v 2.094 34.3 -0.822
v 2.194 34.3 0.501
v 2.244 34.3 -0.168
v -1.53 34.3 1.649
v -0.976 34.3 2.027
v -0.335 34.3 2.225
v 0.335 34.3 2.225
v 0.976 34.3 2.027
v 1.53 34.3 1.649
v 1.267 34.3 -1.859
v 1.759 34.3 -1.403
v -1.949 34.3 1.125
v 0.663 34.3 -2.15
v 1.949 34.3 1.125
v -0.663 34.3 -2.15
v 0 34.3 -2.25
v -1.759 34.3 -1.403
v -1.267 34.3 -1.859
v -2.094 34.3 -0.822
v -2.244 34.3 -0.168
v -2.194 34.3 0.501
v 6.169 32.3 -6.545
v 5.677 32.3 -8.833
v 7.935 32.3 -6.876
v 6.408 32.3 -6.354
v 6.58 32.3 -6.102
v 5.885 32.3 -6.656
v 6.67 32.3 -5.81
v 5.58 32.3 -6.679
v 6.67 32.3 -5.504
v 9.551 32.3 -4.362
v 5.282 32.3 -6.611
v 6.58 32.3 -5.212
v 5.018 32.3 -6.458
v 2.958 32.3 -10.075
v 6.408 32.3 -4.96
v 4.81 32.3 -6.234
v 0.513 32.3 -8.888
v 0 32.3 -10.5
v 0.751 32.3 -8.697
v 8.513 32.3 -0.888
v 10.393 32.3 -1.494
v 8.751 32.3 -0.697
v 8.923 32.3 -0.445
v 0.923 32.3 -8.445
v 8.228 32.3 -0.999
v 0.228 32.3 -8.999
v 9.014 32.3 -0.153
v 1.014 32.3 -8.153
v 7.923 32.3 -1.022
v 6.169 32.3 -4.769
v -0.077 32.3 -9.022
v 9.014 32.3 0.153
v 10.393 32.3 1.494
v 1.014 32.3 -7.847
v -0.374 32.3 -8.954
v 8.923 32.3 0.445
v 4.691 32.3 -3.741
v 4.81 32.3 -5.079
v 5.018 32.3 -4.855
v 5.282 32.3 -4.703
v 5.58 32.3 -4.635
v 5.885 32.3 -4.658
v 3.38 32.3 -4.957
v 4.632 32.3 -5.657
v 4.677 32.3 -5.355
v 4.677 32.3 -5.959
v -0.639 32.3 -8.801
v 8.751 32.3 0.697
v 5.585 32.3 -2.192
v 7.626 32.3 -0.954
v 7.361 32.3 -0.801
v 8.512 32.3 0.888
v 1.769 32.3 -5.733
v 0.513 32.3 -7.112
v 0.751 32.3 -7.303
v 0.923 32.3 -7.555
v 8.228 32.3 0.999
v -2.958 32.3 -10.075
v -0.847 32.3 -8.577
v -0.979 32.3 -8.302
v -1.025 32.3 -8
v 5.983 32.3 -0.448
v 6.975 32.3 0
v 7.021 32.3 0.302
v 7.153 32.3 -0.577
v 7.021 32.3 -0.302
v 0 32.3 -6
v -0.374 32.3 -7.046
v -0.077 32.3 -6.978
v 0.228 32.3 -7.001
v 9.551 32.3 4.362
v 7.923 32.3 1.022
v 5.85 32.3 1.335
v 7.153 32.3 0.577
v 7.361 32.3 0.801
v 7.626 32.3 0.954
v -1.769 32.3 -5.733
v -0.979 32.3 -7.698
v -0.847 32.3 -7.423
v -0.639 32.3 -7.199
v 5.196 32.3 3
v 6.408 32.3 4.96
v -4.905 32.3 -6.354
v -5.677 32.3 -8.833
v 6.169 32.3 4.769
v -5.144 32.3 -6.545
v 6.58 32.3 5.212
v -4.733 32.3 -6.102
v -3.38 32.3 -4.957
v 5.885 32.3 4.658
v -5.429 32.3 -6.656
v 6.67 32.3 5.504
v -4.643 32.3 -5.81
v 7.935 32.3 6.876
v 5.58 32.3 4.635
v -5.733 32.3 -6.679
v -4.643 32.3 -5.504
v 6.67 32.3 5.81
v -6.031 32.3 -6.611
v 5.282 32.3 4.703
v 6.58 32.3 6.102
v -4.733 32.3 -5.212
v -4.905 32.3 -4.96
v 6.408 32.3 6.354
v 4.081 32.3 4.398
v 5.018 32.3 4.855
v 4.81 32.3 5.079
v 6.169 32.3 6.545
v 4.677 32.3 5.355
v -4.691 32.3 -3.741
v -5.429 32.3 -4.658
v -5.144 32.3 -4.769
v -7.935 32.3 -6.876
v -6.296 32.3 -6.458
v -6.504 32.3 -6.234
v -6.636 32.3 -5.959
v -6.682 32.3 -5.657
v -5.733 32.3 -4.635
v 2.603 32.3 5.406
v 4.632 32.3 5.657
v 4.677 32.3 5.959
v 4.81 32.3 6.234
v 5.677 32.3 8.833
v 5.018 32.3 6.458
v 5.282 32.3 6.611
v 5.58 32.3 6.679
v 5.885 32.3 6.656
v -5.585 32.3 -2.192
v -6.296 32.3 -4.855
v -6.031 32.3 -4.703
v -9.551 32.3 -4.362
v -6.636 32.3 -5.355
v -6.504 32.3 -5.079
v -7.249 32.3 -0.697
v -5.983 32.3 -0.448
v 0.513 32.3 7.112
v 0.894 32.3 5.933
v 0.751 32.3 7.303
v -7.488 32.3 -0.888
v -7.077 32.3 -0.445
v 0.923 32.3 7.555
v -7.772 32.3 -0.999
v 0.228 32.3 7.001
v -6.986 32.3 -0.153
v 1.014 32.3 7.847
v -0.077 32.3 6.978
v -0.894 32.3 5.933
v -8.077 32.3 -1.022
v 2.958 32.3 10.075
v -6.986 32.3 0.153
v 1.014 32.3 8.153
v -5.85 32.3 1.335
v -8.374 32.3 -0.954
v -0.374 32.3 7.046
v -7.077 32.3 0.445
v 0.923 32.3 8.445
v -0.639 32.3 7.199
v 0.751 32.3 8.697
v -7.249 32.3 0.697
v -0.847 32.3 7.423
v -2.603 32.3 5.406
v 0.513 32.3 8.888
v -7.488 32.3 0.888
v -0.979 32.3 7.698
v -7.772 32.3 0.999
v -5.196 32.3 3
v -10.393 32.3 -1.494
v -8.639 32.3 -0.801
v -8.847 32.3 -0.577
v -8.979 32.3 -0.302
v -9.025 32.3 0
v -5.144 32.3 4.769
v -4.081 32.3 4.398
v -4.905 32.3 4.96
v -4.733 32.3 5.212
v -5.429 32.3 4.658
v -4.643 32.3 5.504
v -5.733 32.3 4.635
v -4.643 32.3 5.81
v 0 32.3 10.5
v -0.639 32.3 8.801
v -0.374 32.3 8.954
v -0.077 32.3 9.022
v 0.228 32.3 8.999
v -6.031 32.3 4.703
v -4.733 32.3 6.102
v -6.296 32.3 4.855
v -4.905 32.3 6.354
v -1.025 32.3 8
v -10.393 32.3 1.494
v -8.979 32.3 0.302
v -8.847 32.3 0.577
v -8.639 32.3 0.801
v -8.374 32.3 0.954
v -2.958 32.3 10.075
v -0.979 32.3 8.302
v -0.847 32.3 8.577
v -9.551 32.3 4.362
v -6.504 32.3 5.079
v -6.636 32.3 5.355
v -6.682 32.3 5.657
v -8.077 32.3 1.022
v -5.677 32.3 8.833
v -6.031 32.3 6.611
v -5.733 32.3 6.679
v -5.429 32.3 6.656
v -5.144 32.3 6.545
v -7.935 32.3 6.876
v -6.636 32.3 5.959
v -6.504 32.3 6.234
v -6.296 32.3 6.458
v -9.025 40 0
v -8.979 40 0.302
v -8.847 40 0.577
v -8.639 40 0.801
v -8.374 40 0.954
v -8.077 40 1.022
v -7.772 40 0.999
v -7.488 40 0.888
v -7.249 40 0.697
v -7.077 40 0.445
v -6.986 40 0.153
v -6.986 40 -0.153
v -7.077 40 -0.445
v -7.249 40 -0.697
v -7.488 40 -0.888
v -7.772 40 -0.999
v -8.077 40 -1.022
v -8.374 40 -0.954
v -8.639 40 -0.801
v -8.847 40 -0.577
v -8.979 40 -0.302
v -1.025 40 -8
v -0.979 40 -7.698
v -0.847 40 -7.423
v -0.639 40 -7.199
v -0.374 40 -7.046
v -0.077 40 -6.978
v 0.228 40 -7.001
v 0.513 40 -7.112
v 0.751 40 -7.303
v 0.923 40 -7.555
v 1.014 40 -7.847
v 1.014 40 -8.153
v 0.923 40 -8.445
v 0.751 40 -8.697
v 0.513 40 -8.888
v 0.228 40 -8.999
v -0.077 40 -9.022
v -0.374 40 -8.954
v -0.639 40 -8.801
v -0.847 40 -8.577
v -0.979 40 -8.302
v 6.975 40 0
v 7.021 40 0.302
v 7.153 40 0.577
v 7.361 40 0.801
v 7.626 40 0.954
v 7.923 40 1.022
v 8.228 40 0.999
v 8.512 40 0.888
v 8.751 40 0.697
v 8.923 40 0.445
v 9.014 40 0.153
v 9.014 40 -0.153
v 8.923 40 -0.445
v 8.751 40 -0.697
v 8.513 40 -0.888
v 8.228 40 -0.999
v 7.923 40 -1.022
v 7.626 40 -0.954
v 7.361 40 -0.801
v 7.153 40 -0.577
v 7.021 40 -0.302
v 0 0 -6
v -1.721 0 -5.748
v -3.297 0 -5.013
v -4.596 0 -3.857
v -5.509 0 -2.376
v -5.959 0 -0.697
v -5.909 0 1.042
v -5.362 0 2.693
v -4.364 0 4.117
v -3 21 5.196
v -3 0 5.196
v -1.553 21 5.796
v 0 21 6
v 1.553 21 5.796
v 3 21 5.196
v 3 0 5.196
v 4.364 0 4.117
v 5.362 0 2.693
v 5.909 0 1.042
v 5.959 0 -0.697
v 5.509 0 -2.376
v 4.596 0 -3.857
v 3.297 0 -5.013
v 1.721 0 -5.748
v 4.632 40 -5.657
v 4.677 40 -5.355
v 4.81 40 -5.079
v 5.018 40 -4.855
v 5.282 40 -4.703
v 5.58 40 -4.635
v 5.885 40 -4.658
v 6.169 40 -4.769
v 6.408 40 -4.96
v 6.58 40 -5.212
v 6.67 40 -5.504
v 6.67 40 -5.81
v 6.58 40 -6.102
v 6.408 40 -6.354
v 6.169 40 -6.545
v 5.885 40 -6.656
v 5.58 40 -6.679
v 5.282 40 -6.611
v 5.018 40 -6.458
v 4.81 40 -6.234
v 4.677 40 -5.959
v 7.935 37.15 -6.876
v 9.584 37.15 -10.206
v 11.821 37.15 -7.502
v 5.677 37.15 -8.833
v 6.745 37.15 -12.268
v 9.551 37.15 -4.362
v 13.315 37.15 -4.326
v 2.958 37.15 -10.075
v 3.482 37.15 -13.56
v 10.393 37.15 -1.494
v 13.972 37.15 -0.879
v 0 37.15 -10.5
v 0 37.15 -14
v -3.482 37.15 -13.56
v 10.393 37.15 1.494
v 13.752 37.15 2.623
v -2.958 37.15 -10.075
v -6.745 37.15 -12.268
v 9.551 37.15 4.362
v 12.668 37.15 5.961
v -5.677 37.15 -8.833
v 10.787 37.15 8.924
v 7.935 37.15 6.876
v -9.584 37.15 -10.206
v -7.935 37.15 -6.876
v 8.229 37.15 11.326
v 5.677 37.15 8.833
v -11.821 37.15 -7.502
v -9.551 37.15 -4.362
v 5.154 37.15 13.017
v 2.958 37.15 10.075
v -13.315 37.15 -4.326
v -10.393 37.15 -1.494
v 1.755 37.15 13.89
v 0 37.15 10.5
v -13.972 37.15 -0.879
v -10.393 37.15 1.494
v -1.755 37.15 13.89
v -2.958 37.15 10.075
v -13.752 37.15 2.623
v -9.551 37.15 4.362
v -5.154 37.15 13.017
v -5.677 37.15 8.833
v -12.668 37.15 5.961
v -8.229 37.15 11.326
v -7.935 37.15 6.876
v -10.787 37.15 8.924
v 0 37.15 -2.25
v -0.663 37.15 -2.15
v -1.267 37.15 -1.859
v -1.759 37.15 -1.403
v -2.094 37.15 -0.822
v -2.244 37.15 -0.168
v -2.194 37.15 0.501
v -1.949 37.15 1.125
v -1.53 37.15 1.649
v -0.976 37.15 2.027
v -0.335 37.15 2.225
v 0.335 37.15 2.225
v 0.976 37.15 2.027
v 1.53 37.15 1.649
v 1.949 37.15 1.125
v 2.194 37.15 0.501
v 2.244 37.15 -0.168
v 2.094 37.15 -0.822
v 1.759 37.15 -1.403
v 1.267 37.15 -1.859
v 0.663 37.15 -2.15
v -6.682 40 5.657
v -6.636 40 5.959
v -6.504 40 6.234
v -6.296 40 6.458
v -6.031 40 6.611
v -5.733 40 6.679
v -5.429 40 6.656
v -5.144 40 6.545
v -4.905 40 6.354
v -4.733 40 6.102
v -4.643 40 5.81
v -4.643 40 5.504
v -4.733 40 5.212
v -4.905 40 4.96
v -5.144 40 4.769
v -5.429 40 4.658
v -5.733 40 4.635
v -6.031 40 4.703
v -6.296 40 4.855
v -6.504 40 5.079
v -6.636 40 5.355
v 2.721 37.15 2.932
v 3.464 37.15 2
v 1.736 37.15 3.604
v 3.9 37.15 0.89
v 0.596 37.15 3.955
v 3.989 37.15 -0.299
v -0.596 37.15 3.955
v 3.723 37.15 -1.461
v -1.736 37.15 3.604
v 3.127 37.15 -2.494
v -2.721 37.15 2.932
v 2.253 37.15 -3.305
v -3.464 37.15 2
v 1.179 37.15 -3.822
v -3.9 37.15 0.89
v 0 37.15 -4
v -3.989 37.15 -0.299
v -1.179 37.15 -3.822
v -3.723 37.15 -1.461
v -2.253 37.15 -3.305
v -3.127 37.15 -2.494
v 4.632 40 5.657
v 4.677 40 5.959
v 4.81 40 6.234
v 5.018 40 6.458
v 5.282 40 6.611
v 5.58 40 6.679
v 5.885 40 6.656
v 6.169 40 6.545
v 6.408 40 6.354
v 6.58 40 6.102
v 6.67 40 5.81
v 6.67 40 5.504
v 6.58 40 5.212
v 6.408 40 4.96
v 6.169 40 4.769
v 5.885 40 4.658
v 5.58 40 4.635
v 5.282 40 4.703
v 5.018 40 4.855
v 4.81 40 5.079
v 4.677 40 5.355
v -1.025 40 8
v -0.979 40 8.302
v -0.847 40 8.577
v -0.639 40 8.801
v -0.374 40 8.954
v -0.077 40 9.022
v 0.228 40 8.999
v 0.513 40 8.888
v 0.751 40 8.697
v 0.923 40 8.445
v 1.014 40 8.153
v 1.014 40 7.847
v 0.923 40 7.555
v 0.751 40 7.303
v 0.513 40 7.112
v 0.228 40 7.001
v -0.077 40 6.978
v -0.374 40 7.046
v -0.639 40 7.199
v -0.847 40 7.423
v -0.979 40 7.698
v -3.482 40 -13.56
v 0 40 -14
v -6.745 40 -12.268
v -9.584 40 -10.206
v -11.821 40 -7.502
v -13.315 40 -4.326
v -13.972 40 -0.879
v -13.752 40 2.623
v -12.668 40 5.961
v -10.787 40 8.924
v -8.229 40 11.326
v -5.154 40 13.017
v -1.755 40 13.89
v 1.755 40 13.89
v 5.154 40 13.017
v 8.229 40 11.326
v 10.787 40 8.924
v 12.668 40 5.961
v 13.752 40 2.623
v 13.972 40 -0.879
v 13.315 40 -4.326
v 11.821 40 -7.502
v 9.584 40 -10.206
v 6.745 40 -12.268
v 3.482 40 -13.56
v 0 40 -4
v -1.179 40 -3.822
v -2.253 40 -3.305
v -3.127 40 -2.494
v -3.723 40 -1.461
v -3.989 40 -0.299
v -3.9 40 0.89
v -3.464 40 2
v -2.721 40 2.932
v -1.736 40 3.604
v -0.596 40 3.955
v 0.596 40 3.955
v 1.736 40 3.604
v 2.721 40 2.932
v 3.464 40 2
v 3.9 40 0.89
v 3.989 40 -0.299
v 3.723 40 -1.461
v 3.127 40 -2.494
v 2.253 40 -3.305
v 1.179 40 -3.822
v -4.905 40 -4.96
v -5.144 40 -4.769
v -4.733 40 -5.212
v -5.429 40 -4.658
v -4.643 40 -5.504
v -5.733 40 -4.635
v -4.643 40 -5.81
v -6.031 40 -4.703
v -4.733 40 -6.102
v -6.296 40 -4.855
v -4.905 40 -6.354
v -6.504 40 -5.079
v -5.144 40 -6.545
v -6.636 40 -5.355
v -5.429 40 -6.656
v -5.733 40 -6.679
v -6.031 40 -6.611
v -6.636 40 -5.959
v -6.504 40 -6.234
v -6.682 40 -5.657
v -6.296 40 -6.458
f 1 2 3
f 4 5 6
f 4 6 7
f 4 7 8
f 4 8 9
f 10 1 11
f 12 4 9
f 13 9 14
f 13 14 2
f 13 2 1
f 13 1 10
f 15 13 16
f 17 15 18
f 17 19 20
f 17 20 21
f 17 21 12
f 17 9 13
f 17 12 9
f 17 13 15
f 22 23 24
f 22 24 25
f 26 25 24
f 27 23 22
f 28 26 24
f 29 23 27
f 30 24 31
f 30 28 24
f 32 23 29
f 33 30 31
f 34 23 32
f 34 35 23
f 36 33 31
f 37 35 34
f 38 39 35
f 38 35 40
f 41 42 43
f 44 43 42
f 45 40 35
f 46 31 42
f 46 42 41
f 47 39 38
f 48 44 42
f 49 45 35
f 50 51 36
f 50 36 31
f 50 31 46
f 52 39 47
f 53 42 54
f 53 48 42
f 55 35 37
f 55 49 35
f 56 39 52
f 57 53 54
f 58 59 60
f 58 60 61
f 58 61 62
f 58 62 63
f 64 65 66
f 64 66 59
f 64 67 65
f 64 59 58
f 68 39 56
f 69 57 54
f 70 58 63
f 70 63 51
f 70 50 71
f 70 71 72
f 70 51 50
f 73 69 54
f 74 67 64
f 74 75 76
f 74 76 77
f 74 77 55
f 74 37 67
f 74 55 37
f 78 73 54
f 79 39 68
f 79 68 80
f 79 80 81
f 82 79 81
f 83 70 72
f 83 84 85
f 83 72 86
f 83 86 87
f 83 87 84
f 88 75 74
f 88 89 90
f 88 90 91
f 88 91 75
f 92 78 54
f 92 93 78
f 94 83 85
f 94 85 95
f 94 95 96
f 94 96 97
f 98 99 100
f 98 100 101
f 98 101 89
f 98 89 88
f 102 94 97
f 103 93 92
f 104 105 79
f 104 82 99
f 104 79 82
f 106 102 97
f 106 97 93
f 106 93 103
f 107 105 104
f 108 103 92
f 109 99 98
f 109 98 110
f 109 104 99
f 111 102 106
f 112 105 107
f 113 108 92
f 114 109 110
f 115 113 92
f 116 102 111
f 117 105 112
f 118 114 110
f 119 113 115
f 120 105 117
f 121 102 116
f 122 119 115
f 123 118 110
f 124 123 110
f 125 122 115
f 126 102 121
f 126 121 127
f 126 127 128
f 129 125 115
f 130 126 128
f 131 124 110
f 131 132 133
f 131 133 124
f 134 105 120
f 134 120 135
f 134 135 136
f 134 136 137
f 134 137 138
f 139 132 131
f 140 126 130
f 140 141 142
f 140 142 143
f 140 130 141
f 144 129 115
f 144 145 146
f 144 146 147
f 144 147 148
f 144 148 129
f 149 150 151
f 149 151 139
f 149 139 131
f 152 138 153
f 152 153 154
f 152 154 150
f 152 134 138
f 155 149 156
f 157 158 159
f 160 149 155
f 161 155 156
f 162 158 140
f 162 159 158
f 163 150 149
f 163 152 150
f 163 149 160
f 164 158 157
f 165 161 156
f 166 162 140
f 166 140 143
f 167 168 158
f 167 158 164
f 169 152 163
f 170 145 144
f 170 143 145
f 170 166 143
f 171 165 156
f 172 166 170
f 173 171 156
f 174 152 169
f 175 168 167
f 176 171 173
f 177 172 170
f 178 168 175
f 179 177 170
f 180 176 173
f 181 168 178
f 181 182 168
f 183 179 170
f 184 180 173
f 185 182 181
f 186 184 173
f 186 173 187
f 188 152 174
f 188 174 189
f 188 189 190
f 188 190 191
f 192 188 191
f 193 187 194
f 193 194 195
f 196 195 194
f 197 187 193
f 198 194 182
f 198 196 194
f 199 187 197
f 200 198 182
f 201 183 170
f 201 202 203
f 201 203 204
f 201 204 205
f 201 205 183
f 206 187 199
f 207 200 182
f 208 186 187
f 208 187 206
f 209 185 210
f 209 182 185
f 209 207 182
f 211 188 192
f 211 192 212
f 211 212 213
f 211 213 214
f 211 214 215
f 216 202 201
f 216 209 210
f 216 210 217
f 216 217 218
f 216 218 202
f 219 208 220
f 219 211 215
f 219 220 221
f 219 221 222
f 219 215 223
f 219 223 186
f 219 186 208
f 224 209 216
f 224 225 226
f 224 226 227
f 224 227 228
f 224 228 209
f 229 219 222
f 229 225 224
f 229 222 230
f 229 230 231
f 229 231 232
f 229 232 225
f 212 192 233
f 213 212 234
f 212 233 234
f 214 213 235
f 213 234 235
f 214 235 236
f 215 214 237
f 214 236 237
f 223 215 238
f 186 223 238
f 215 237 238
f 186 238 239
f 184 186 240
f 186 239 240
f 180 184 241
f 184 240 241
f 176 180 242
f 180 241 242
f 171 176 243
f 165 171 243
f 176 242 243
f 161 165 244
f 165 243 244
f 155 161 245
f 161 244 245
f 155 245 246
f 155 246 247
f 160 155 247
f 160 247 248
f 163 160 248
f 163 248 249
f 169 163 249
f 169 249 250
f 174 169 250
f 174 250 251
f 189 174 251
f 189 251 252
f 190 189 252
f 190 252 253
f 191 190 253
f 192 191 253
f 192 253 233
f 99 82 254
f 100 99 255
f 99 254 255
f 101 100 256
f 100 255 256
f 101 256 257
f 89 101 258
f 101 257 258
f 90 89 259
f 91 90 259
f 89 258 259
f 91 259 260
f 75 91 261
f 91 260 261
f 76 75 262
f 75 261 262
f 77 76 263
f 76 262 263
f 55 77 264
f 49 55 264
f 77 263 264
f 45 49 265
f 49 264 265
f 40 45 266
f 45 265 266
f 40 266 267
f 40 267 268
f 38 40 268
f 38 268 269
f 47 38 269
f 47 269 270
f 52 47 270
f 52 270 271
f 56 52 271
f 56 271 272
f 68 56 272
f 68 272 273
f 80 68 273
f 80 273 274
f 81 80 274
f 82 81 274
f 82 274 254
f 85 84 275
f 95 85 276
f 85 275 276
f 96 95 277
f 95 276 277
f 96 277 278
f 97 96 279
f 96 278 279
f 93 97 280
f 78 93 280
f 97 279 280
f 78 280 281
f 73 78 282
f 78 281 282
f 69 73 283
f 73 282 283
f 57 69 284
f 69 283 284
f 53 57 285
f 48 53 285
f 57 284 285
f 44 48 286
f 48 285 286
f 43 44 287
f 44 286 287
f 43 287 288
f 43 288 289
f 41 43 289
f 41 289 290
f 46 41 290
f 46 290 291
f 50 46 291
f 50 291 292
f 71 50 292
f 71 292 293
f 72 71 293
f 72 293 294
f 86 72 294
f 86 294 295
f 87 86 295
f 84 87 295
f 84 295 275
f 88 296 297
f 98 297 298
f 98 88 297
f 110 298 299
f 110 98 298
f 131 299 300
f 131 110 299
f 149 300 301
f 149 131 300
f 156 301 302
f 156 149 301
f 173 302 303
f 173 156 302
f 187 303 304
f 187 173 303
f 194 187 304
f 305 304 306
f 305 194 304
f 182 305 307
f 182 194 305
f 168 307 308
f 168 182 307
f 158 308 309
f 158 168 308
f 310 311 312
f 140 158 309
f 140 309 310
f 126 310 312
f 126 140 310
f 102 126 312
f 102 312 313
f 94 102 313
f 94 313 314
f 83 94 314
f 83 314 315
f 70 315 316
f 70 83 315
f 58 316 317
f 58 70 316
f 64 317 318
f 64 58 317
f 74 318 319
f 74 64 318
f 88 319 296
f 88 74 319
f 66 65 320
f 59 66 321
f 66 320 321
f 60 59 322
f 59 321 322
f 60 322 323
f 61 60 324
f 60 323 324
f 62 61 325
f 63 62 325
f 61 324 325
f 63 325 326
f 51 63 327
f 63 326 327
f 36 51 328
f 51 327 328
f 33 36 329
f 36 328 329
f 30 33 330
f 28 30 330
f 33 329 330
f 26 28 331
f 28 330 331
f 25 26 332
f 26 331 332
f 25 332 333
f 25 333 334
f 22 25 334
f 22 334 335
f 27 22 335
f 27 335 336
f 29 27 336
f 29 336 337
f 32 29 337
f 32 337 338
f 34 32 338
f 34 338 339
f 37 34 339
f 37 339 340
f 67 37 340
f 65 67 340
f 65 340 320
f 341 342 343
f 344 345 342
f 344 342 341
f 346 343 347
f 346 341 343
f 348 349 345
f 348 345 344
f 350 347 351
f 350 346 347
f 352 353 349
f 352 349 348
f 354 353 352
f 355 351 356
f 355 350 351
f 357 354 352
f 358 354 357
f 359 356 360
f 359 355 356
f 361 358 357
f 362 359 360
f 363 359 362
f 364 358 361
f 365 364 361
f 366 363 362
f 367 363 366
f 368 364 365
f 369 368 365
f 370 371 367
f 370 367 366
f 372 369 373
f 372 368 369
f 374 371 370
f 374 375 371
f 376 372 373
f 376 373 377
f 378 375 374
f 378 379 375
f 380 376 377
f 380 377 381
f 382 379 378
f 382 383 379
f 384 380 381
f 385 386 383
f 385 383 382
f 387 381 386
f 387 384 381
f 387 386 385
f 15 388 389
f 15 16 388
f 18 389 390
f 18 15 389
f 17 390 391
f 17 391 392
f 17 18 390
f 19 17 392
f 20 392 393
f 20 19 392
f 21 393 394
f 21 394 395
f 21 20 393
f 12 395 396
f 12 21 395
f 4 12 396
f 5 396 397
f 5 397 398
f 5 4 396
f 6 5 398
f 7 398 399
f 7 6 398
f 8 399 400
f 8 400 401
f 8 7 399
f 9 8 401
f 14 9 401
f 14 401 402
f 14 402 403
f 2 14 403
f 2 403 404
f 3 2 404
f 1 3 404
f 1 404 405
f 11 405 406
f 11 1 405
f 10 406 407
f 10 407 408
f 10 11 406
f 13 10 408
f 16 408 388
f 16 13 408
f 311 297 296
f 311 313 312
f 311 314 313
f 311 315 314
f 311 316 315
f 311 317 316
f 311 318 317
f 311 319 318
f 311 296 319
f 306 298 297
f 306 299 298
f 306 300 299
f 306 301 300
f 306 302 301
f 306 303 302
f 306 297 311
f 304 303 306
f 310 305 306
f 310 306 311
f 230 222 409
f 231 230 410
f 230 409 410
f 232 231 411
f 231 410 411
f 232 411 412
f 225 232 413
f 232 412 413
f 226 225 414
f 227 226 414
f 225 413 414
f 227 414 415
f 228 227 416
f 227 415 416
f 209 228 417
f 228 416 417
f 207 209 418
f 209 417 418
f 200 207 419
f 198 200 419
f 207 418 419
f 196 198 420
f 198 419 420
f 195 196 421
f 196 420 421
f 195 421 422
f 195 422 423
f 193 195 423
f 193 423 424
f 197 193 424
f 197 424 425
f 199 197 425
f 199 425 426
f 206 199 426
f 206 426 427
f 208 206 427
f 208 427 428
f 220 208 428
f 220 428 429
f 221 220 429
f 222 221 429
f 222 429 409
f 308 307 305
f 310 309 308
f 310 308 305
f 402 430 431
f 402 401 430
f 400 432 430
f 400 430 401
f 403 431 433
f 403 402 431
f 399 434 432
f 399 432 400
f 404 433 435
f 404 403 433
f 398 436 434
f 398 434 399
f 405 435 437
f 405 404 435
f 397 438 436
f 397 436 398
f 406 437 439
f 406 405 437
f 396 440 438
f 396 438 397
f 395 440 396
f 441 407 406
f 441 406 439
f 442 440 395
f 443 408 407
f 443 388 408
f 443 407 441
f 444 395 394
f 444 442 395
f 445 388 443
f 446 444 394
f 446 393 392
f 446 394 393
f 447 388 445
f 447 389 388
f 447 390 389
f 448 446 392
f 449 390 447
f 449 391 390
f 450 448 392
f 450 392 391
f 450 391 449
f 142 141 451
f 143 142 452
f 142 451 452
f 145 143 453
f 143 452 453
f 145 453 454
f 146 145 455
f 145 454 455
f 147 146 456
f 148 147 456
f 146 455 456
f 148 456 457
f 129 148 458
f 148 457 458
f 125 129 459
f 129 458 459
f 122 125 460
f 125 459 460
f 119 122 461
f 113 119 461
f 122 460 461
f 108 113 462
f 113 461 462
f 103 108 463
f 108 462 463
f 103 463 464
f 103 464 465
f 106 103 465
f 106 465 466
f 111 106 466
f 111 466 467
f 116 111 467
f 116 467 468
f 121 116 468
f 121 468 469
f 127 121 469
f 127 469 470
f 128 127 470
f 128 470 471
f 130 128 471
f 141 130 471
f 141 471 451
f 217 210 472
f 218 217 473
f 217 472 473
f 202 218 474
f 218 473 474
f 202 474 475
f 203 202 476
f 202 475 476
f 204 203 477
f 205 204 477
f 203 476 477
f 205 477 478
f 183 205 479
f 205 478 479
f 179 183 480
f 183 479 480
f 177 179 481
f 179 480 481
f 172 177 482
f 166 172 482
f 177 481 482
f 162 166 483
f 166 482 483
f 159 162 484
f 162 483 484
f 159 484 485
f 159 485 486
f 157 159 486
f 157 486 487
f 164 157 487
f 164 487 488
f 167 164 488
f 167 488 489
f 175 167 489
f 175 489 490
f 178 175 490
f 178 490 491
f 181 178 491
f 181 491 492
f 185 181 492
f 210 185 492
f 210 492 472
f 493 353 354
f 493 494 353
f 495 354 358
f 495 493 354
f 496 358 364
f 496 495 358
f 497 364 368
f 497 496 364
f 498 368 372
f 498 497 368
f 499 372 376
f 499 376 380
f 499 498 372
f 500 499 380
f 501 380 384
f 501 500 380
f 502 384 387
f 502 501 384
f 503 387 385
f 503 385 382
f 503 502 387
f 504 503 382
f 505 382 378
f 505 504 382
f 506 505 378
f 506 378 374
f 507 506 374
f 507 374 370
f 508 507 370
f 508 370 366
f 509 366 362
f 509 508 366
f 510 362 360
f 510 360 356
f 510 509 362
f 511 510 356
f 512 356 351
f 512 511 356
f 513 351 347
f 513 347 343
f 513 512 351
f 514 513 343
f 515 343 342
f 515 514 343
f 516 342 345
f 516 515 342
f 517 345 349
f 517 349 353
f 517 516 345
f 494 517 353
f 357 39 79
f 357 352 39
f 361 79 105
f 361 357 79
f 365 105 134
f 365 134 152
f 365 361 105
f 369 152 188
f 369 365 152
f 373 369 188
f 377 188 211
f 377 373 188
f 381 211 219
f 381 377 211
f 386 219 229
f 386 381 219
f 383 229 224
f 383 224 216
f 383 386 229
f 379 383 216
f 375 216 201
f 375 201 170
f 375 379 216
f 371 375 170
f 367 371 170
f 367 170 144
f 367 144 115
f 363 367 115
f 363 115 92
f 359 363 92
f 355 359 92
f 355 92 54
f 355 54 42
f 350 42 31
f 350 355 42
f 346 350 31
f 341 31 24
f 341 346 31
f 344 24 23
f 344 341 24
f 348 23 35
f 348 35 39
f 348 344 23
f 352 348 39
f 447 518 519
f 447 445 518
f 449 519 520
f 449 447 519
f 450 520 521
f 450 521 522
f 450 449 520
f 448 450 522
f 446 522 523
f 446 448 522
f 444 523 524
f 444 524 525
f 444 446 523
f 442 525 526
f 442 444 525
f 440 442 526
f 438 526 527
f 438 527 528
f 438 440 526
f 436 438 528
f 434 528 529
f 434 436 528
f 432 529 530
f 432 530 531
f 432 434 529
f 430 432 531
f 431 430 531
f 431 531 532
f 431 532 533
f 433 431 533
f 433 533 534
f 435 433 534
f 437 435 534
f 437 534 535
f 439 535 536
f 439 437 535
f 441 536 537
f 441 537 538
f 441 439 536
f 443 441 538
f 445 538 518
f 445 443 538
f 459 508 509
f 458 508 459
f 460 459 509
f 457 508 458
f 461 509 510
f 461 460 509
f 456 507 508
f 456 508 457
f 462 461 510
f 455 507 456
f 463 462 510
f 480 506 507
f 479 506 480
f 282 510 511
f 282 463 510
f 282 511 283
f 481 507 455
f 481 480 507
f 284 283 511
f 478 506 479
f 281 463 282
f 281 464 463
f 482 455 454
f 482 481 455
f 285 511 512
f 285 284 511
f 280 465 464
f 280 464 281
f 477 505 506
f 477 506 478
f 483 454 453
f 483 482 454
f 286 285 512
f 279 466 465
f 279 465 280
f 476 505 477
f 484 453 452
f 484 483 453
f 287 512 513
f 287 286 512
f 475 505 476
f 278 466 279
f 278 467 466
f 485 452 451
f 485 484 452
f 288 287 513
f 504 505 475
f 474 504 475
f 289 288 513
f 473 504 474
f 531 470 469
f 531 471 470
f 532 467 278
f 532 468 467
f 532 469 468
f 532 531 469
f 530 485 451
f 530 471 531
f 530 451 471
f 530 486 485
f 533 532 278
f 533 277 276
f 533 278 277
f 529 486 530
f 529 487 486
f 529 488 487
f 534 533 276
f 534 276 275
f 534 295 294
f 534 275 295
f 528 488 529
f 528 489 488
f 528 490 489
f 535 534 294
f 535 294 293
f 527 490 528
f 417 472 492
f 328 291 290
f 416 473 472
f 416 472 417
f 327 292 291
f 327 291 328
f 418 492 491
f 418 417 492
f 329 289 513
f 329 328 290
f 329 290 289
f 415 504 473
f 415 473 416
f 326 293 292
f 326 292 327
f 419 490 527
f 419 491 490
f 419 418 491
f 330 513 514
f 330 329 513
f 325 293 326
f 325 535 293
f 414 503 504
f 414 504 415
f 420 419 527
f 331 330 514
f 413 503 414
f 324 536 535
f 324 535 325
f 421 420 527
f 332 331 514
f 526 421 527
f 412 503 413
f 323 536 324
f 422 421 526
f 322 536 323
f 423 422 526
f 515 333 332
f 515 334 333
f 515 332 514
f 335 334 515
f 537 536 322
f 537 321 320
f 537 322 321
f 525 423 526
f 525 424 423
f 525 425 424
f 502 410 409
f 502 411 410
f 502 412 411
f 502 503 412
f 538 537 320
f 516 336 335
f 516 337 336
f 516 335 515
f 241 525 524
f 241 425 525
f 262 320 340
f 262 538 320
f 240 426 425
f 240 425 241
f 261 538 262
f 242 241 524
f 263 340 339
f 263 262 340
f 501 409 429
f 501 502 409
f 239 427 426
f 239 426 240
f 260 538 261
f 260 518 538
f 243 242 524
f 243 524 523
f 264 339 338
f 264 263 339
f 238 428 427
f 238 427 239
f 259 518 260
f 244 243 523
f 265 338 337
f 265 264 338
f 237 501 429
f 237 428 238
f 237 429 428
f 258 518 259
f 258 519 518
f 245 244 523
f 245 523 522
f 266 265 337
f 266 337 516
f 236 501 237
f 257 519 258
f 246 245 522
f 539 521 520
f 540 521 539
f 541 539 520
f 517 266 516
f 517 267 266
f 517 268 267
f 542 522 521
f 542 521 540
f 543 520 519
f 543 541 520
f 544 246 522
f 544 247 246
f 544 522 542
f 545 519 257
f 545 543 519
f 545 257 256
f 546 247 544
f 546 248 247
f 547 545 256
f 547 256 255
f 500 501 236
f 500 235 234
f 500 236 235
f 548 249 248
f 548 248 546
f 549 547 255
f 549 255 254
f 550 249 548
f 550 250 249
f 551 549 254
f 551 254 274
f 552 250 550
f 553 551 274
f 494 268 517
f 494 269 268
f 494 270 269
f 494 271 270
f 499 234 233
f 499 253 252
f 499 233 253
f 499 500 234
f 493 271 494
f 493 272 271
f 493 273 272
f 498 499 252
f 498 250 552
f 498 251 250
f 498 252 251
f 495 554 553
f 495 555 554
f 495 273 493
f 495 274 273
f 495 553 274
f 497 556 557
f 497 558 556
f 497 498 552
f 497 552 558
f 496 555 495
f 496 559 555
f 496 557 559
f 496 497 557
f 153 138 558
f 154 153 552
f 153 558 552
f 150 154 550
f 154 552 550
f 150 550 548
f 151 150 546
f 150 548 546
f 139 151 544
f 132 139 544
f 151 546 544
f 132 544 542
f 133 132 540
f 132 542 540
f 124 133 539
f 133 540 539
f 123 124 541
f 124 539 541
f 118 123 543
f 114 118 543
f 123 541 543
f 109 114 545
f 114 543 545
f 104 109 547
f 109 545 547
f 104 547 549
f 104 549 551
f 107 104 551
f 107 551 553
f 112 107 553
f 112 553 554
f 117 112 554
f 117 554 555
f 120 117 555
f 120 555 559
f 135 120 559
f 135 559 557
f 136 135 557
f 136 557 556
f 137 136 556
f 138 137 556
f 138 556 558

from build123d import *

# Parameters (mm, degrees)
TAP_DRILL_FOR_M2_5X0_45_TAP2_D = 2.05
CUT_EXTRUDE1_DEPTH             = 21


with BuildPart() as part:
    # Sketch3 → Revolve1 (revolve)
    with BuildSketch(Plane.XY, mode=Mode.PRIVATE) as revolve1_sk:
        Polygon((-2.25, 34.3), (0, 34.3), (0, 0), (-6, 0), (-6, 32.3), (-10.5, 32.3), (-10.5, 37.15), (-14, 37.15), (-14, 40), (-4, 40), (-4, 37.15), (-2.25, 37.15), align=None)
    revolve(revolve1_sk.sketch.rotate(Axis((0, 0, 0), (0, 1, 0)), 270), axis=Axis((0, 0, 0), (0, 1, 0)))

    # Tap Drill for M2.5x0.45 Tap2 (through all)
    with Locations(Plane.XZ.offset(-32.3)):
        with Locations((-5.656854249, 5.656854249), (0, 8), (5.656854249, 5.656854249), (8, 0), (5.656854249, -5.656854249), (0, -8), (-5.656854249, -5.656854249), (-8, 0)):
            Hole(TAP_DRILL_FOR_M2_5X0_45_TAP2_D / 2)

    # Sketch13 → Cut-Extrude1 (cut)
    with BuildSketch(Plane.XZ):
        Polygon((-64.283224073, 5.196152423), (-3, 5.196152423), (3, 5.196152423), (64.283224073, 5.196152423), (64.283224073, 127.762600569), (-64.283224073, 127.762600569), align=None)
    extrude(amount=-CUT_EXTRUDE1_DEPTH, mode=Mode.SUBTRACT)


solid = part.part
